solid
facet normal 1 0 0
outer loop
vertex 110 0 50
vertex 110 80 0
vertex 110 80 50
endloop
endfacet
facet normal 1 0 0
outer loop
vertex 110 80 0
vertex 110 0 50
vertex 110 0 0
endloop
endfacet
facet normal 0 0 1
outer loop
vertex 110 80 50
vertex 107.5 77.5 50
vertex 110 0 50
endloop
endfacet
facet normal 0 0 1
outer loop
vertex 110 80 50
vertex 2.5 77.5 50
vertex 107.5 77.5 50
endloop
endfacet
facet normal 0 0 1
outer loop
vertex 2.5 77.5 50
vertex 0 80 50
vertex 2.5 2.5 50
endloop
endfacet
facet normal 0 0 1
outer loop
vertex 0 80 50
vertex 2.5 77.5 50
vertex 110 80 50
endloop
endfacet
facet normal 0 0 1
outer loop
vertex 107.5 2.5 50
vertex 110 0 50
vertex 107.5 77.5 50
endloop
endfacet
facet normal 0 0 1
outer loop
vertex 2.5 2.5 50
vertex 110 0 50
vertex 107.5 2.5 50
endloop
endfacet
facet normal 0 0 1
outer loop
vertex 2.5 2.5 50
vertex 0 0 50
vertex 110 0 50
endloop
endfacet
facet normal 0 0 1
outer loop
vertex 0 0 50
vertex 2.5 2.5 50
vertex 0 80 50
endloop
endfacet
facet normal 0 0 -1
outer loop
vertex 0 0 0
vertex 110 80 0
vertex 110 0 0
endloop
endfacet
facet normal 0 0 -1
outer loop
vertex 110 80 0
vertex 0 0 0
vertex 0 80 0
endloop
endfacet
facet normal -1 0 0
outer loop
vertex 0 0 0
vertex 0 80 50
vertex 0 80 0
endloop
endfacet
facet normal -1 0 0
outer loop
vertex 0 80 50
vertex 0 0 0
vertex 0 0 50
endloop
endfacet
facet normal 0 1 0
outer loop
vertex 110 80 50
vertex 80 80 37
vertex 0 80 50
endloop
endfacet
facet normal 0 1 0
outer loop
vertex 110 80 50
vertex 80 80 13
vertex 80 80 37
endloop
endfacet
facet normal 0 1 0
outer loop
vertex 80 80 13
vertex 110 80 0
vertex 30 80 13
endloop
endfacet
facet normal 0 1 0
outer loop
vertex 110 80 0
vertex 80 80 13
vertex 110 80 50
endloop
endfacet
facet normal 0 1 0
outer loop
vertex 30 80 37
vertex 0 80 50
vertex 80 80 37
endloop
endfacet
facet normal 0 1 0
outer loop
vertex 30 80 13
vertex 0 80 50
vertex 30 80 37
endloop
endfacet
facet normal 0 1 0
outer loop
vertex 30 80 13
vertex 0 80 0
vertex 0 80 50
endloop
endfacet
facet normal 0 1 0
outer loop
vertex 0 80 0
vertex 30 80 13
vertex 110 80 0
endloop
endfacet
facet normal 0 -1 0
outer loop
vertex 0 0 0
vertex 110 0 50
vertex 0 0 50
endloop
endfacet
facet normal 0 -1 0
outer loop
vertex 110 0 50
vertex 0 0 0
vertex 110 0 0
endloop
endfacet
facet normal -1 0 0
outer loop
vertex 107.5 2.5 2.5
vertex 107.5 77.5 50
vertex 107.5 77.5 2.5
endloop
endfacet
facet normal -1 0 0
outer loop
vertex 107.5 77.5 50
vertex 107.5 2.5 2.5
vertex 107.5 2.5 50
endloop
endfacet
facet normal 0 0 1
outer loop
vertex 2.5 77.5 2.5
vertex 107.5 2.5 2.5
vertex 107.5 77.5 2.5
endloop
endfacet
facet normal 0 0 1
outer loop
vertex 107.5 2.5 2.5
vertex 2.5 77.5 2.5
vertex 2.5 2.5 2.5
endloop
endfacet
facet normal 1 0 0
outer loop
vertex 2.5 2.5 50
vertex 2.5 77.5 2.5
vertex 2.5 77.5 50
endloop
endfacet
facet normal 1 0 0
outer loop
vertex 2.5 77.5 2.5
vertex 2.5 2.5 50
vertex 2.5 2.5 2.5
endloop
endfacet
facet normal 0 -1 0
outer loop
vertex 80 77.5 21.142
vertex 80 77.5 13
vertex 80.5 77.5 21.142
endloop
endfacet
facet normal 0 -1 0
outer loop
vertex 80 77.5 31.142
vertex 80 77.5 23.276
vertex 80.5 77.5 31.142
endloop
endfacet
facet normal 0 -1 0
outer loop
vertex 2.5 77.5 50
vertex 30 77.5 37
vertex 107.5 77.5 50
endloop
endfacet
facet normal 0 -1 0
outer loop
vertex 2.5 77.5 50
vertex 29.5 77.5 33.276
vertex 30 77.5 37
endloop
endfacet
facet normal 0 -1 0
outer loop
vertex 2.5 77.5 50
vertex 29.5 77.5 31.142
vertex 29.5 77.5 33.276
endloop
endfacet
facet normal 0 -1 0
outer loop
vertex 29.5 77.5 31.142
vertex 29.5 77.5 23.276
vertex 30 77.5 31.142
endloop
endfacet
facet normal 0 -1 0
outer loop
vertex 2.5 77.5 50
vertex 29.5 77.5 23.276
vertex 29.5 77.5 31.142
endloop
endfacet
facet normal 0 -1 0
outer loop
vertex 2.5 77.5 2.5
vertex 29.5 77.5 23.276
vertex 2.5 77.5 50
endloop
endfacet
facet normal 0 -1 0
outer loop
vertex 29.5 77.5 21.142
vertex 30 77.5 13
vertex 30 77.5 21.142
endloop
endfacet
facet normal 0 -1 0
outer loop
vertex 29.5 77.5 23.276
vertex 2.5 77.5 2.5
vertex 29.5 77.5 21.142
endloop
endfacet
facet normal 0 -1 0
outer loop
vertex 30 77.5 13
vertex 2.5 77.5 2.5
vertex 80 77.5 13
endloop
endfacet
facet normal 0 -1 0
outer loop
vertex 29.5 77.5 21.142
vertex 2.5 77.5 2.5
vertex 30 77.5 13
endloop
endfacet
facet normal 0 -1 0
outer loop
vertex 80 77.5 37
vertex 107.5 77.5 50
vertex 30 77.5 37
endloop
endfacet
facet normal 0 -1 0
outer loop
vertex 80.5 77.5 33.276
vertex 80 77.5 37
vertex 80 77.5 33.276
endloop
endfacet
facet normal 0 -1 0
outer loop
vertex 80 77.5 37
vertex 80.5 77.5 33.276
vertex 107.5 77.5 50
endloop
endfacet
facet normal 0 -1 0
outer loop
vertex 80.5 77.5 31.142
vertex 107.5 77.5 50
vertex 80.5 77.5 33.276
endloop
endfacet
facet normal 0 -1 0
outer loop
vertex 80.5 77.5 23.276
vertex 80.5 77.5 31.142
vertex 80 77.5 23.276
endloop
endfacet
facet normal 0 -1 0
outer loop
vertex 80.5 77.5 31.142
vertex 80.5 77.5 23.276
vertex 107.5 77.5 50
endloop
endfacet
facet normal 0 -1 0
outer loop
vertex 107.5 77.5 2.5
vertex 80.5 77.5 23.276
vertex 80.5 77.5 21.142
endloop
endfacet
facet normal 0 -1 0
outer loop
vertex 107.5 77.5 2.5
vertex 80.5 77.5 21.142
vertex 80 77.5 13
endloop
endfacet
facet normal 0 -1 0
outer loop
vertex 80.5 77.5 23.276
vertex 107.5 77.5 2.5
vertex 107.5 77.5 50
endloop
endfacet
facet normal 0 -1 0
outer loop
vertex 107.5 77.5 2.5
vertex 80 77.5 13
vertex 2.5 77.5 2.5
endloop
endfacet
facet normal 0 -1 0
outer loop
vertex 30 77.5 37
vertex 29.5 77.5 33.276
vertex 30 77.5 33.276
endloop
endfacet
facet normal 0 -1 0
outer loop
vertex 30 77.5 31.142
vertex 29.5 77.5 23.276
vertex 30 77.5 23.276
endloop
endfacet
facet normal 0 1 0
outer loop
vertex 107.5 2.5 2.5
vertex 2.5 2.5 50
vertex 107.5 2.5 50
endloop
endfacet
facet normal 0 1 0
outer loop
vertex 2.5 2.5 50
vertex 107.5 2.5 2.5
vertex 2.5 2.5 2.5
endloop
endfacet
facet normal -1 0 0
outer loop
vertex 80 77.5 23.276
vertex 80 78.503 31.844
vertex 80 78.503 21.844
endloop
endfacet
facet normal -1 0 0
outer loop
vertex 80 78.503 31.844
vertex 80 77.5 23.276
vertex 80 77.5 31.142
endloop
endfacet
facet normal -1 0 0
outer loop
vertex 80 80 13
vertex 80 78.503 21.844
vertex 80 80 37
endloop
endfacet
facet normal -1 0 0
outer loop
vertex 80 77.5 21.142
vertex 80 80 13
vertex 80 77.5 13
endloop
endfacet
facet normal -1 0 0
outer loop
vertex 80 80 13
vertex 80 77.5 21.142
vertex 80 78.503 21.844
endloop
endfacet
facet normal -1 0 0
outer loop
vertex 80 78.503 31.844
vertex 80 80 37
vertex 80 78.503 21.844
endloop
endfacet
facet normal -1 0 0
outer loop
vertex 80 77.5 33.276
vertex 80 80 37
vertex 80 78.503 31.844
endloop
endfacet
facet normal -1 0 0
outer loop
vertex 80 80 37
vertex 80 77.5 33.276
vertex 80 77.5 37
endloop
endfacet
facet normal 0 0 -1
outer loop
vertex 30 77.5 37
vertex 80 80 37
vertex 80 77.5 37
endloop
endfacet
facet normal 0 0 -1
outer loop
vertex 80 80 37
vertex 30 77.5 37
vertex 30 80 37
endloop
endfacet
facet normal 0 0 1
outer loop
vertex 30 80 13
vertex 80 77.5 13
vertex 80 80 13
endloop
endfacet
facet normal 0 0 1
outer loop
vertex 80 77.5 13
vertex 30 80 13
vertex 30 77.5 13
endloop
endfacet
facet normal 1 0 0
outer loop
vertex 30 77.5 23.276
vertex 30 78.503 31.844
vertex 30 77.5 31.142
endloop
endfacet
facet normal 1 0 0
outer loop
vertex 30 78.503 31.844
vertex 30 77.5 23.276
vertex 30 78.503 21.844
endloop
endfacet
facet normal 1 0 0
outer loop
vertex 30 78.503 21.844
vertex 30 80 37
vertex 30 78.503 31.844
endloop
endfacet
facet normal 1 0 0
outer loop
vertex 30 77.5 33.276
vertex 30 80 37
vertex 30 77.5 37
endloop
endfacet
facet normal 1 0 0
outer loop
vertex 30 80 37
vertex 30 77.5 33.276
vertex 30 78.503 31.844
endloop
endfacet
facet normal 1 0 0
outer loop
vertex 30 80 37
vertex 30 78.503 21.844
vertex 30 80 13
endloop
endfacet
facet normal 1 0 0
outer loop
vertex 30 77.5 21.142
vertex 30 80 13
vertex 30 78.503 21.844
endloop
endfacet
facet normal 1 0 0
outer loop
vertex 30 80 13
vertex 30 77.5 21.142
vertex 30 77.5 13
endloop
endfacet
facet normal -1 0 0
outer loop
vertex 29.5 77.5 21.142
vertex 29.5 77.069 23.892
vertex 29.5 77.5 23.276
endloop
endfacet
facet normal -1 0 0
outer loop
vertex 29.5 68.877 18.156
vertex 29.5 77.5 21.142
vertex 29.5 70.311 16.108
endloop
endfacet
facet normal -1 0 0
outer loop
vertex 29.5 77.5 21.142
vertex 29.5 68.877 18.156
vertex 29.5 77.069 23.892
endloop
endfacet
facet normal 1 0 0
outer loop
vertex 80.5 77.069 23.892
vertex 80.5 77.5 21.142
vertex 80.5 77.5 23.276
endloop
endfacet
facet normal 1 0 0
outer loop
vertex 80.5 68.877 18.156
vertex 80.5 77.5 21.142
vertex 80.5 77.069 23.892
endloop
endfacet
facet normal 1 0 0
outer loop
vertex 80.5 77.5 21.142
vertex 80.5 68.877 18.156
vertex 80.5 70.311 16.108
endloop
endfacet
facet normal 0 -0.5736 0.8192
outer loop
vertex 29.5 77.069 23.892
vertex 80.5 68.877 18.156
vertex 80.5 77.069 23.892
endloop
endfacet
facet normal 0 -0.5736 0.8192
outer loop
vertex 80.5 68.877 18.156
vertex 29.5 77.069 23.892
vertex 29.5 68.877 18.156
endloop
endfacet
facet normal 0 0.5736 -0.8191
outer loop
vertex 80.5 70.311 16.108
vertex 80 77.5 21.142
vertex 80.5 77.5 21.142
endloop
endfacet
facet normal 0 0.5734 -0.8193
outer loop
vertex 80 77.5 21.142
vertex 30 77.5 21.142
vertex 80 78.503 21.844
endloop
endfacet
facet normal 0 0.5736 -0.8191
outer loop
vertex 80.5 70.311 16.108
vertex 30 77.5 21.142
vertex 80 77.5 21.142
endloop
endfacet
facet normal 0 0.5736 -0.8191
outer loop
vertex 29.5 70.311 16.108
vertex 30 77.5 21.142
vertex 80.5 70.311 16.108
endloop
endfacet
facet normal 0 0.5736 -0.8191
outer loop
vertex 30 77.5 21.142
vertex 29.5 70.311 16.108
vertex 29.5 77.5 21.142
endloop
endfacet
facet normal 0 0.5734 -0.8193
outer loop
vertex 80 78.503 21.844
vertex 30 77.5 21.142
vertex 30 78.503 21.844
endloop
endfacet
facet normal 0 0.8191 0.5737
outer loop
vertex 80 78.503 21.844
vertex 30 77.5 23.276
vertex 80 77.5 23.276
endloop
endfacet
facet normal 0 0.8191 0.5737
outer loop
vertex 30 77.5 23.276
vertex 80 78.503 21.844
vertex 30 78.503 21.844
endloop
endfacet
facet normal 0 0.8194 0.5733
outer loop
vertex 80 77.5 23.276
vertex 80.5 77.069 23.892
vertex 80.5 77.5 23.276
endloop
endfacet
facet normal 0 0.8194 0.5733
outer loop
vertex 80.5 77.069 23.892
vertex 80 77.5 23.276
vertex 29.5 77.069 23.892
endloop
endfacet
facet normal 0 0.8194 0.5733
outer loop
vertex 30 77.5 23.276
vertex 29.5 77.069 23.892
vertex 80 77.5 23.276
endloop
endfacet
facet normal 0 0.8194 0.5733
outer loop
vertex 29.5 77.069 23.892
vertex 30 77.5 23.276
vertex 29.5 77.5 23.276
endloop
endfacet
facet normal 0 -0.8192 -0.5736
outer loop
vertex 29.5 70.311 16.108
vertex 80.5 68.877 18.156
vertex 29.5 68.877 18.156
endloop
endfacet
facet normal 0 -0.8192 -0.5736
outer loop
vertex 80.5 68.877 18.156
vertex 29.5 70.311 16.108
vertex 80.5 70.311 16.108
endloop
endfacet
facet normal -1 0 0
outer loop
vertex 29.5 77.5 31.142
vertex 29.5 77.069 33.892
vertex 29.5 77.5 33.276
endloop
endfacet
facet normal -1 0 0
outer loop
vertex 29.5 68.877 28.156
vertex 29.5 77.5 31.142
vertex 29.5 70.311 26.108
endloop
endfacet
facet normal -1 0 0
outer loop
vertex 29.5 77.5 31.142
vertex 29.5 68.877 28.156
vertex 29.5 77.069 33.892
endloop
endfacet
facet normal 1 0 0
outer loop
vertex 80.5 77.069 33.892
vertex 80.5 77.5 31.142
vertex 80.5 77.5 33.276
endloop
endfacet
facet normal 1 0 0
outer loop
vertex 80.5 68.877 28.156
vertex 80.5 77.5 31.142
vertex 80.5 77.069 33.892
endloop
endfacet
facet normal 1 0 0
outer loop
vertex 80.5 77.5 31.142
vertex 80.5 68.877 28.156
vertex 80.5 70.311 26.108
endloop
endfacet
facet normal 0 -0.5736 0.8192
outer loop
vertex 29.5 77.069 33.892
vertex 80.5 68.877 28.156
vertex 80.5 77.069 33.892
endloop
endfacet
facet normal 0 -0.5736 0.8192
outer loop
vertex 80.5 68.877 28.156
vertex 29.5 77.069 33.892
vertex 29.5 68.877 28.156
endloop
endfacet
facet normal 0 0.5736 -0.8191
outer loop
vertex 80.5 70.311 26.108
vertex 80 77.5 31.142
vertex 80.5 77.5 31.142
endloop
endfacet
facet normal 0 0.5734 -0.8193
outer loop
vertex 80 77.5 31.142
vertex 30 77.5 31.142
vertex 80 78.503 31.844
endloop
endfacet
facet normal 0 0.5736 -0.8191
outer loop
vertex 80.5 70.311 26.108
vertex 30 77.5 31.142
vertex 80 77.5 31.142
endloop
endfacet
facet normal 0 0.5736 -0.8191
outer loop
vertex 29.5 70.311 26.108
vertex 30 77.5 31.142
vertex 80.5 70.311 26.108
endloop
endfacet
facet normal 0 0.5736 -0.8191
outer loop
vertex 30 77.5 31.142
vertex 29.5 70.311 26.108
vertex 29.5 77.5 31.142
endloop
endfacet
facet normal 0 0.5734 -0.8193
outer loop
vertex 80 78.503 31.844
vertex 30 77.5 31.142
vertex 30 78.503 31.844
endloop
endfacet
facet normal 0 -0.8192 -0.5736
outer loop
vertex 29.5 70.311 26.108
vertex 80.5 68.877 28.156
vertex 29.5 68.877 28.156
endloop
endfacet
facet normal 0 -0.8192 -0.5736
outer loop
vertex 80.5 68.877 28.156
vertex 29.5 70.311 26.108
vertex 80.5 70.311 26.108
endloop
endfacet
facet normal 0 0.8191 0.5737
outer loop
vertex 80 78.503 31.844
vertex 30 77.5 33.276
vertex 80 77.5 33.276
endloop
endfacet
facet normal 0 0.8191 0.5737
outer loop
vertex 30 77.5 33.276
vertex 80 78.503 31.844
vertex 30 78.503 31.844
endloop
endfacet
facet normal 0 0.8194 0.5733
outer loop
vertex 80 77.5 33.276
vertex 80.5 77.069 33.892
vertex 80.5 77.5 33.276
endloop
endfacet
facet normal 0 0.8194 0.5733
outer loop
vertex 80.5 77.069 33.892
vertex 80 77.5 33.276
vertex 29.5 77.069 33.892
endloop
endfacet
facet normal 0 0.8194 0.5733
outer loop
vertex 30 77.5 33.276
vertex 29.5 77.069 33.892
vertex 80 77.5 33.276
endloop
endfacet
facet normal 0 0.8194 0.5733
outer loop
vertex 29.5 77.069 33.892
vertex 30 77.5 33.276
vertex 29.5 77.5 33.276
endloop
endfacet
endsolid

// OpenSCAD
$fn = 32;

// ----------------------------------------------------------------------
// Vent box: louvers enclosure
// ----------------------------------------------------------------------

// --- parameters (mm) ---
box_l = 110;              // box length, X
box_w = 80;               // box width, Y
box_h = 50;               // box height, Z
wall_t = 2.5;             // shell wall thickness
win_l = 50;               // vent window width, X
win_h = 24;               // vent window height, Z
slat_t = 2.5;             // louver slat thickness
slat_d = 10;              // louver slat depth
slat_a = 35;              // louver slat angle, degrees
slat_pitch = 10;          // louver pitch
slat_yc = 73.69;          // slat centreline Y

win_z0 = (box_h - win_h) / 2;  // window lower edge Z
n_slats = 2;  // louver count
slat_z0 = win_z0 + (win_h - (n_slats - 1) * slat_pitch) / 2;

difference() {
  union() {
    difference() {
      cube([box_l, box_w, box_h]);
  translate([wall_t, wall_t, wall_t])
    cube([box_l - 2 * wall_t, box_w - 2 * wall_t, box_h]);
  translate([(box_l - win_l) / 2, box_w - wall_t - 1, win_z0])
    cube([win_l, wall_t + 2, win_h]);
    }
    for (i = [0 : n_slats - 1])
      translate([box_l / 2, slat_yc, slat_z0 + i * slat_pitch])
        rotate([slat_a, 0, 0])
          cube([win_l + 1, slat_d, slat_t], center = true);
  }
}
